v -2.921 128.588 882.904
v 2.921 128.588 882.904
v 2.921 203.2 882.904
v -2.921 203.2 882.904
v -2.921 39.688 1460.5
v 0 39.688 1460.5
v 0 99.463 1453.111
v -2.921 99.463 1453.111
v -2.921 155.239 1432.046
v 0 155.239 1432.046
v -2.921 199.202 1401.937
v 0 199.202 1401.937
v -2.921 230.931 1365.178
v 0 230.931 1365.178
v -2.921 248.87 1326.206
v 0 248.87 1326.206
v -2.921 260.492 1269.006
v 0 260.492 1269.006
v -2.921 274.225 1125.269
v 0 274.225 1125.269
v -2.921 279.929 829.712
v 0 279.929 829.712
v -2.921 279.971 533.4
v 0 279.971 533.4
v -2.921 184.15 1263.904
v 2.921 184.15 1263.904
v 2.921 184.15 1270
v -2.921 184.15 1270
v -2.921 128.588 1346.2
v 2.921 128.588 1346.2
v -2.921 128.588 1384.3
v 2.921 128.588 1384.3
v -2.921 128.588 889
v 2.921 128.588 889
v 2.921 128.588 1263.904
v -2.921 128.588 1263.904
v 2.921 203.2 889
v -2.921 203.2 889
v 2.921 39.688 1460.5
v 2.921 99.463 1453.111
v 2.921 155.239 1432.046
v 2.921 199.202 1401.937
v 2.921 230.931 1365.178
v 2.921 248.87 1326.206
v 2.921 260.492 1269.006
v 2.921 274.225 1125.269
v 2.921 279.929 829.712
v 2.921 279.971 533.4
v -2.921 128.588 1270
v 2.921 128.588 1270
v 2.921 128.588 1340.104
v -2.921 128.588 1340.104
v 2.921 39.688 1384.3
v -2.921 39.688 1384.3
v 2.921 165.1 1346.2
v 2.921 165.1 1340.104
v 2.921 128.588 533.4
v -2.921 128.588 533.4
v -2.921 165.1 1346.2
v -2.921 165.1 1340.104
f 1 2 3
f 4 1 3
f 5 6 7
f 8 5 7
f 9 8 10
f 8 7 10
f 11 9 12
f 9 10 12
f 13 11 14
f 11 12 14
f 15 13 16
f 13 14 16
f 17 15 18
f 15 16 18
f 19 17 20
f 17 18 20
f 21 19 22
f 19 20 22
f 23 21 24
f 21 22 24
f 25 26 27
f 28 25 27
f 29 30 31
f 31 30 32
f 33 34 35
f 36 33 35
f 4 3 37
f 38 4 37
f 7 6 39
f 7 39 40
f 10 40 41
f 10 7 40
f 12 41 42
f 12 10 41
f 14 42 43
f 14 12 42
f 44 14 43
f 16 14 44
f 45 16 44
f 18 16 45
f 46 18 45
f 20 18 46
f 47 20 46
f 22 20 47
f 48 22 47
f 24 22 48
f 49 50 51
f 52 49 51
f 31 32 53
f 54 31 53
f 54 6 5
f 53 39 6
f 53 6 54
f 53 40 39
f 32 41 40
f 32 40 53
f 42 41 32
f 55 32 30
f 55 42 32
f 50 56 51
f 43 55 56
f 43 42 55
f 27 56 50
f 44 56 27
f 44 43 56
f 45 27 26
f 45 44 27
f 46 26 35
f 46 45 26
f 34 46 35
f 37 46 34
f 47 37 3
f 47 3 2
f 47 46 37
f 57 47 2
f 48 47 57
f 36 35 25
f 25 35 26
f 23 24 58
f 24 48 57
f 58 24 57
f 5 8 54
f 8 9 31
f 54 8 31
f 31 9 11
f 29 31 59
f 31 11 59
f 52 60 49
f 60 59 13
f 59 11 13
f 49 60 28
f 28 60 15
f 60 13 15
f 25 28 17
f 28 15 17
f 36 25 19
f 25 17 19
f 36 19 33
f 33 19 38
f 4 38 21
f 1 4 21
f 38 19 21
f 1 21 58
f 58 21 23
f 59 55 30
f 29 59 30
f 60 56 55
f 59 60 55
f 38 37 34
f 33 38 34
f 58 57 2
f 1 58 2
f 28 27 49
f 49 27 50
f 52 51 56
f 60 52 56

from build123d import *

# Parameters (mm, degrees)
BOSS_EXTRUDE1_DEPTH = 2.921
CUT_EXTRUDE1_DEPTH  = 1488.311355111


with BuildPart() as part:
    # Sketch3 → Boss-Extrude1 (new, symmetric)
    with BuildSketch(Plane(origin=(0, 0, 0), x_dir=(0, 0, -1), z_dir=(1, 0, 0))):
        with BuildLine():
            Line((-1460.5, 39.6875), (381, 39.6875))
            add(Edge.make_bspline(
                [(-1460.5, 39.6875), (-1460.5, 123.854582151), (-1400.448958782, 238.643618873), (-1168.264534851, 278.653196971), (-889.863220578, 278.192638574), (-549.517003244, 284.069445788), (-254.872972463, 268.16247247), (-19.653982034, 247.753440535), (192.838300002, 207.087014824), (381, 130.986638489), (381, 39.6875)],
                knots=[0, 0, 0, 0, 0.114447643, 0.153235008, 0.341616396, 0.529762749, 0.655350341, 0.781406837, 0.871201698, 1, 1, 1, 1], degree=3))
        make_face()
    extrude(amount=BOSS_EXTRUDE1_DEPTH, both=True)

    # Sketch5 → Cut-Extrude1 (cut, through all)
    with BuildSketch(Plane(origin=(2.921, 0, 0), x_dir=(0, 0, -1), z_dir=(1, 0, 0))):
        Polygon((-1384.3, 39.6875), (545.915550589, 39.6875), (545.915550589, 328.856345879), (-533.4, 328.856345879), (-533.4, 128.5875), (-882.904, 128.5875), (-882.904, 203.2), (-889, 203.2), (-889, 128.5875), (-1263.904, 128.5875), (-1263.904, 184.15), (-1270, 184.15), (-1270, 128.5875), (-1340.104, 128.5875), (-1340.104, 165.1), (-1346.2, 165.1), (-1346.2, 128.5875), (-1384.3, 128.5875), align=None)
    extrude(amount=-CUT_EXTRUDE1_DEPTH, mode=Mode.SUBTRACT)


solid = part.part
